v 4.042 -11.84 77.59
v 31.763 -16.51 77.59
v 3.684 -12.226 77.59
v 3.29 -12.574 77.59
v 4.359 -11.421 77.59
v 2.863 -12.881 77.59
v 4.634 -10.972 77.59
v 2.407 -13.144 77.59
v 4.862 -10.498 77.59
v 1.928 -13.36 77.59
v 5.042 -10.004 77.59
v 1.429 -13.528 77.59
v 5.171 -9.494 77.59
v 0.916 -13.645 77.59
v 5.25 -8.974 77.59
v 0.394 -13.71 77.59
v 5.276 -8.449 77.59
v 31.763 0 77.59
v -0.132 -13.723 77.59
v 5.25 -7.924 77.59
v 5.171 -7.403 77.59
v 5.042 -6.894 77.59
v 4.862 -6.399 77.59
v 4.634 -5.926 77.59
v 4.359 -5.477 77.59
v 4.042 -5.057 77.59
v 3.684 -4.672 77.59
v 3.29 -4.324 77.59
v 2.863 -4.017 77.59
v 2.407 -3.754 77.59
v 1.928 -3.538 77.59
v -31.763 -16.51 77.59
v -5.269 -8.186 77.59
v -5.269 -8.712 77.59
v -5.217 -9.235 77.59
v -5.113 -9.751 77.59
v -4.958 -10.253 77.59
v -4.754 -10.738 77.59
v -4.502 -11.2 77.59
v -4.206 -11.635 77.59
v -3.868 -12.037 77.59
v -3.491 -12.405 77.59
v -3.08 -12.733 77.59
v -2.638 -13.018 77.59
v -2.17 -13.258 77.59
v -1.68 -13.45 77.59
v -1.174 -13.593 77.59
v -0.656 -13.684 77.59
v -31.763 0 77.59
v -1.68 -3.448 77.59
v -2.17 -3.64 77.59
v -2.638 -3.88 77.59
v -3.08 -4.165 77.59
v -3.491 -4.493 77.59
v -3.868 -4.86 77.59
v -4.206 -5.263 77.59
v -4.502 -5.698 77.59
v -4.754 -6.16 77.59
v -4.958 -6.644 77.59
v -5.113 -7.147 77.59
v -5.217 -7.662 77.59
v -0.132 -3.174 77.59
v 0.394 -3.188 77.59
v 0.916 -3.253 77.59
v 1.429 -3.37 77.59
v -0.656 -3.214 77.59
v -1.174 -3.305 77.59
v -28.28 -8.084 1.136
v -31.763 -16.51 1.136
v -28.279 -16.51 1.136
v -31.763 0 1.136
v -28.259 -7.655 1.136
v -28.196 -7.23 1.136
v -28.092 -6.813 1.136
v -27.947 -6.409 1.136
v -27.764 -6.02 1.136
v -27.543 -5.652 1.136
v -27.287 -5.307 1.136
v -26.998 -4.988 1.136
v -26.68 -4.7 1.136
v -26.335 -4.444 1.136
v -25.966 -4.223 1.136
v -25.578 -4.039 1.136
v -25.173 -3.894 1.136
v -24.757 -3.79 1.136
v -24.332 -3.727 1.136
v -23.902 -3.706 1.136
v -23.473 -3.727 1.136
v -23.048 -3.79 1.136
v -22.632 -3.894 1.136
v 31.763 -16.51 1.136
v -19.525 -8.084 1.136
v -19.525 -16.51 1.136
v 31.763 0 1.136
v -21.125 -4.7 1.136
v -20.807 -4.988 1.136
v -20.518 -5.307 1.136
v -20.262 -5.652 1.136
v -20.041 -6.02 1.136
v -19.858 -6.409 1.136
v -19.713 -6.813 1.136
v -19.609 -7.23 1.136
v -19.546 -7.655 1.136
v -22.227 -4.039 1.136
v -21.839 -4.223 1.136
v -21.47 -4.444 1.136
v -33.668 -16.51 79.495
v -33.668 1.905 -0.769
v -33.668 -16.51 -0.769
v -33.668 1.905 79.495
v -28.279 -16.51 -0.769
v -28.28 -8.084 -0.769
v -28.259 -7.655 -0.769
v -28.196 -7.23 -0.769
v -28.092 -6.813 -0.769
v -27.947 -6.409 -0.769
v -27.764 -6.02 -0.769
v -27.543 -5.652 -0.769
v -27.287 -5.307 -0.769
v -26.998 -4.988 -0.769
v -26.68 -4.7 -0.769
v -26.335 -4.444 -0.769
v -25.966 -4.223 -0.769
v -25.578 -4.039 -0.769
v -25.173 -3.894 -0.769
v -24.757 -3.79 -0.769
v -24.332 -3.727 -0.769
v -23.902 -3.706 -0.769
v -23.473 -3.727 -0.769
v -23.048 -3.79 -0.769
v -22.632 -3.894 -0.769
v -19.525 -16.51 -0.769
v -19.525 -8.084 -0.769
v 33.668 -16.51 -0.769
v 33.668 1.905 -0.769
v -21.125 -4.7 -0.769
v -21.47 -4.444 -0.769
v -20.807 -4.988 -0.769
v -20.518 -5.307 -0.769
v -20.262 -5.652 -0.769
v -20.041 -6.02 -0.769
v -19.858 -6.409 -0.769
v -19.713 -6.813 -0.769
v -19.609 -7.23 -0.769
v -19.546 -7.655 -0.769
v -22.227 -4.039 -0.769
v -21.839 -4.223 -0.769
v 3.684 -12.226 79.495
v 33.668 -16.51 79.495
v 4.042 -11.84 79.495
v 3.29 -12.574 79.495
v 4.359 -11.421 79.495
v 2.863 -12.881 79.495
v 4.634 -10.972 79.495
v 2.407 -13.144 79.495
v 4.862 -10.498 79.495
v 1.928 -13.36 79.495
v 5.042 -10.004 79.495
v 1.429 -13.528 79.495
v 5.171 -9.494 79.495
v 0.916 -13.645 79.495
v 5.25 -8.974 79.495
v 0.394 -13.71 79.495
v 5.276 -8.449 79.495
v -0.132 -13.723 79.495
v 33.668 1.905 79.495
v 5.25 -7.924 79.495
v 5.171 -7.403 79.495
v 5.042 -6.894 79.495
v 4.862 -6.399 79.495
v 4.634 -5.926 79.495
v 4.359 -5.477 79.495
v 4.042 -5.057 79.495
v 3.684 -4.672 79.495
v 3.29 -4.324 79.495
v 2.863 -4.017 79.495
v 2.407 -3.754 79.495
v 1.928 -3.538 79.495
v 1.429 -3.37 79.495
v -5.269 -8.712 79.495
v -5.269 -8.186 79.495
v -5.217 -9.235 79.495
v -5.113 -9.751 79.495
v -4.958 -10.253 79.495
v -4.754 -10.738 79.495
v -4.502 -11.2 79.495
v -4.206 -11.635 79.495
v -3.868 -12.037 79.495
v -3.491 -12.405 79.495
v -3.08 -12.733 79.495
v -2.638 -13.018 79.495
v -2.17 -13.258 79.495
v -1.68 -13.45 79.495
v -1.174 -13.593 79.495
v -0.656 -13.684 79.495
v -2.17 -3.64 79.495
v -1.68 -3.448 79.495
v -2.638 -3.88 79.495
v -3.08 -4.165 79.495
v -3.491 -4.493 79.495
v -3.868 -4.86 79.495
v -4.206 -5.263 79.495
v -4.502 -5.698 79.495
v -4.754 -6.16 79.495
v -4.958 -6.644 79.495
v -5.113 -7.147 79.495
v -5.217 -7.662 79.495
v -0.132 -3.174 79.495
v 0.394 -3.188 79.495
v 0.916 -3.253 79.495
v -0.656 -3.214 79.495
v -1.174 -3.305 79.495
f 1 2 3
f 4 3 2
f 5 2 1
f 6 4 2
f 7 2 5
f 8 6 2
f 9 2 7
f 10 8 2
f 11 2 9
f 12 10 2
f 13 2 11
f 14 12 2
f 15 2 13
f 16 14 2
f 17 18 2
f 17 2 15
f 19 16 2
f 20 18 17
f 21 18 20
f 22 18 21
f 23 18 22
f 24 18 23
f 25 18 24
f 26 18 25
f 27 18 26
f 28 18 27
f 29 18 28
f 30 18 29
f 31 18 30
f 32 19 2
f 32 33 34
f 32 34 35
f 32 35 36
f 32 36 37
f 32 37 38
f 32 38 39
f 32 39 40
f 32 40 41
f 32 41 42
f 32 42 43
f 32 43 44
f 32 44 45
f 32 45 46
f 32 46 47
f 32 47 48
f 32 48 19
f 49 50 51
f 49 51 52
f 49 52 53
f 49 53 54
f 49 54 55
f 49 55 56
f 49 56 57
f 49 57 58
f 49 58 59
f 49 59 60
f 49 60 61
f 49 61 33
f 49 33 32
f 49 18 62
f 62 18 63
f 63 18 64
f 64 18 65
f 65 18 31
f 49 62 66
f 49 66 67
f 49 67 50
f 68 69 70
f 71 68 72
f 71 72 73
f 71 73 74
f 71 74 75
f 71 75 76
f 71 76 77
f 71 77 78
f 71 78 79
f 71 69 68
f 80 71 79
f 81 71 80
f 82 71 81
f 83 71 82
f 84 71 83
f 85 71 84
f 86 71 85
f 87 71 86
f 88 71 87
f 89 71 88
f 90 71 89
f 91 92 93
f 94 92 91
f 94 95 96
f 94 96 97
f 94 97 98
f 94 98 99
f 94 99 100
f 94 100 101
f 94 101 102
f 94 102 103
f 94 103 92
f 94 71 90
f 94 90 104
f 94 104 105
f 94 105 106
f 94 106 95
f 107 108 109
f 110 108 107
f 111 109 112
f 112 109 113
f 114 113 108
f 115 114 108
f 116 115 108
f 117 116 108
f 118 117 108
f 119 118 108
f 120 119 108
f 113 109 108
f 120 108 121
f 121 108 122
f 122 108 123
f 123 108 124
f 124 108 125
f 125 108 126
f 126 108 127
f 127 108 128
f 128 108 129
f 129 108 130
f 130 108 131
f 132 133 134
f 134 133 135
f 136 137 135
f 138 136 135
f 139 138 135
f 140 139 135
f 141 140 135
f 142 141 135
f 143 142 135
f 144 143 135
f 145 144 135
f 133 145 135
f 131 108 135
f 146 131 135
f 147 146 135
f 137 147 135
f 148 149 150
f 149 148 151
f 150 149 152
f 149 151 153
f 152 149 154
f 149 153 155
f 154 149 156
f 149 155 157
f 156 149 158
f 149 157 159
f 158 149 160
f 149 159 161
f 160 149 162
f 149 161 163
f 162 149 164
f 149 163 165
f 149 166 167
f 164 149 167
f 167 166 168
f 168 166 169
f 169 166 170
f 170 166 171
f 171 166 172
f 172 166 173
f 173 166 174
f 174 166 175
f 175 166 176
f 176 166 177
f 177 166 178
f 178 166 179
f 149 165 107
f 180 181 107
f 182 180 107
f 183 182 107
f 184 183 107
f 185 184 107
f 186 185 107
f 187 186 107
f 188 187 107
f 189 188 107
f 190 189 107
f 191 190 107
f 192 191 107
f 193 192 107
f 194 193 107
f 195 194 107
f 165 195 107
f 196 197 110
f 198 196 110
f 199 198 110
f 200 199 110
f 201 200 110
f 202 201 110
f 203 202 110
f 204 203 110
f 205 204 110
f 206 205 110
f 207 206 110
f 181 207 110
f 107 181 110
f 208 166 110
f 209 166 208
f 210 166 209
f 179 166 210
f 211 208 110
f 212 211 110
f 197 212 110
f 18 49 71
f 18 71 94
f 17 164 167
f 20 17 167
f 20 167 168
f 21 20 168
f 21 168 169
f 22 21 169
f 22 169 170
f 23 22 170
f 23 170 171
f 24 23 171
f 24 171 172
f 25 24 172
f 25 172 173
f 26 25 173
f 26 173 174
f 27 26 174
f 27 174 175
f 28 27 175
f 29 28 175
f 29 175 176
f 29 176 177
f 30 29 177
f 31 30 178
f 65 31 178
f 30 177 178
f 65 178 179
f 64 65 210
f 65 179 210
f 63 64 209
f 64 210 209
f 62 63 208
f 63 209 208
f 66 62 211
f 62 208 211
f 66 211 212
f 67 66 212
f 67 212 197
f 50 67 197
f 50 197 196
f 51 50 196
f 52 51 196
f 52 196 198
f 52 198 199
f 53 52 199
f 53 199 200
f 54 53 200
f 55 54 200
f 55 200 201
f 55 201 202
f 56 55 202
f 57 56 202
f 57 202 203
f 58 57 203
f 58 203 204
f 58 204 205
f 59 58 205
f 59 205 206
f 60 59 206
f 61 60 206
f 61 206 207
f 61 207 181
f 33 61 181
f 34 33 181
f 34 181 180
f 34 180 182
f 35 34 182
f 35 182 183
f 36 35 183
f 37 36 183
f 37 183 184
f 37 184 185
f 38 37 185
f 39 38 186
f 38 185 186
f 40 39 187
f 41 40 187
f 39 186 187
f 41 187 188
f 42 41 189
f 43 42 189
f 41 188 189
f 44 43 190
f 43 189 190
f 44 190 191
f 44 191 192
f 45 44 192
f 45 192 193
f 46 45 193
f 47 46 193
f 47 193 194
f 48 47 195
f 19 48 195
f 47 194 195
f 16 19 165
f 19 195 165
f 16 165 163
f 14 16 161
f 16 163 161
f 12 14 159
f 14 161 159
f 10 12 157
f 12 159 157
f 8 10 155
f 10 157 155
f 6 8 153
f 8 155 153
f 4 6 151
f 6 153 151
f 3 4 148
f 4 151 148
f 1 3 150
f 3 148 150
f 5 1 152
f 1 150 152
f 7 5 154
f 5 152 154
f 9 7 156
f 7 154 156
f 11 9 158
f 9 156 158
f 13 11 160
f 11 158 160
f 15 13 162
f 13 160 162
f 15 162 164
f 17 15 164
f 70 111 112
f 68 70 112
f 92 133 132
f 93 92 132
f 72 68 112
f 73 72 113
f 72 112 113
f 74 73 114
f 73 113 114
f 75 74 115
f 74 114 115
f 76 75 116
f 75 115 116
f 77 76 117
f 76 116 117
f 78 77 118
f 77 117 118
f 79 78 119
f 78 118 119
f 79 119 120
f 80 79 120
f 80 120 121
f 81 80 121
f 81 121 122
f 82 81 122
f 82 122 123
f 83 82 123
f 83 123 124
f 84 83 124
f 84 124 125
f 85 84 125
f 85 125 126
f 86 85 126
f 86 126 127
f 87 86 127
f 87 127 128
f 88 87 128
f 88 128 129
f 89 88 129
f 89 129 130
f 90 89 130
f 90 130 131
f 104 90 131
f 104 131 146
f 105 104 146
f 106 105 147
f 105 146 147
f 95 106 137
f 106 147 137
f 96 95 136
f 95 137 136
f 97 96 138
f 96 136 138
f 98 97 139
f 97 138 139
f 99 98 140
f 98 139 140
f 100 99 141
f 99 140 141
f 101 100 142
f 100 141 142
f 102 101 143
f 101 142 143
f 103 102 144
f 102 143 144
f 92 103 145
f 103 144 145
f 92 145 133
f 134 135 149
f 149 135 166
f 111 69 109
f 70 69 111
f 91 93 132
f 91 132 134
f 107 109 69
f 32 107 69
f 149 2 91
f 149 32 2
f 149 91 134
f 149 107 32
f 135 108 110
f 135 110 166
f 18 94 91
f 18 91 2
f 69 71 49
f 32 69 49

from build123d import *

# Parameters (mm, degrees)
F0_W     = 31.7627
F0_H     = 76.454
F1_DEPTH = 16.51
F2_T     = 1.905
F3_R     = 5.2760492521
F4_DEPTH = 25.4
F5_R     = 4.3777369445
F6_DEPTH = 25.4
F9_DEPTH = 25.4


with BuildPart() as f1:
    # F0 (on Front) → F1 (new body)
    with BuildSketch(Plane.XZ):
        with Locations((15.88135, 8.247606141)):
            Rectangle(F0_W, F0_H)
        with Locations((-15.88135, 8.247606141)):
            Rectangle(F0_W, F0_H)
    extrude(amount=F1_DEPTH)

    # F2
    f2_openings = [f1.faces().sort_by_distance(p)[0] for p in [
        (0, -16.51, 8.247606),
    ]]
    offset(amount=F2_T, openings=f2_openings, kind=Kind.INTERSECTION)

    # F3 (on face) → F4 (cut)
    with BuildSketch(Plane.XY.offset(48.379606141)):
        with Locations((0, -8.4488391876)):
            Circle(F3_R)
    extrude(amount=-F4_DEPTH, mode=Mode.SUBTRACT)

    # F5 (on face) → F6 (cut)
    with BuildSketch(Plane(origin=(0, 0, -31.884393859), x_dir=(1, 0, 0), z_dir=(0, 0, -1))):
        with Locations((-23.9024627954, 8.0834906548)):
            Circle(F5_R)
    extrude(amount=-F6_DEPTH, mode=Mode.SUBTRACT)


with BuildPart() as f1_1:
    # F7: moved
    add(f1.part.moved(Location((0, 0, 31.115))))

    # F8 (on face) → F9 (cut)
    with BuildSketch(Plane(origin=(0, 0, -0.769393859), x_dir=(1, 0, 0), z_dir=(0, 0, -1))):
        Polygon((-28.2801996592, 8.0843311799), (-19.5247259315, 8.0843311799), (-19.5247259315, 16.51), (-28.2785819315, 16.51), align=None)
    extrude(amount=-F9_DEPTH, mode=Mode.SUBTRACT)


solid = f1_1.part
